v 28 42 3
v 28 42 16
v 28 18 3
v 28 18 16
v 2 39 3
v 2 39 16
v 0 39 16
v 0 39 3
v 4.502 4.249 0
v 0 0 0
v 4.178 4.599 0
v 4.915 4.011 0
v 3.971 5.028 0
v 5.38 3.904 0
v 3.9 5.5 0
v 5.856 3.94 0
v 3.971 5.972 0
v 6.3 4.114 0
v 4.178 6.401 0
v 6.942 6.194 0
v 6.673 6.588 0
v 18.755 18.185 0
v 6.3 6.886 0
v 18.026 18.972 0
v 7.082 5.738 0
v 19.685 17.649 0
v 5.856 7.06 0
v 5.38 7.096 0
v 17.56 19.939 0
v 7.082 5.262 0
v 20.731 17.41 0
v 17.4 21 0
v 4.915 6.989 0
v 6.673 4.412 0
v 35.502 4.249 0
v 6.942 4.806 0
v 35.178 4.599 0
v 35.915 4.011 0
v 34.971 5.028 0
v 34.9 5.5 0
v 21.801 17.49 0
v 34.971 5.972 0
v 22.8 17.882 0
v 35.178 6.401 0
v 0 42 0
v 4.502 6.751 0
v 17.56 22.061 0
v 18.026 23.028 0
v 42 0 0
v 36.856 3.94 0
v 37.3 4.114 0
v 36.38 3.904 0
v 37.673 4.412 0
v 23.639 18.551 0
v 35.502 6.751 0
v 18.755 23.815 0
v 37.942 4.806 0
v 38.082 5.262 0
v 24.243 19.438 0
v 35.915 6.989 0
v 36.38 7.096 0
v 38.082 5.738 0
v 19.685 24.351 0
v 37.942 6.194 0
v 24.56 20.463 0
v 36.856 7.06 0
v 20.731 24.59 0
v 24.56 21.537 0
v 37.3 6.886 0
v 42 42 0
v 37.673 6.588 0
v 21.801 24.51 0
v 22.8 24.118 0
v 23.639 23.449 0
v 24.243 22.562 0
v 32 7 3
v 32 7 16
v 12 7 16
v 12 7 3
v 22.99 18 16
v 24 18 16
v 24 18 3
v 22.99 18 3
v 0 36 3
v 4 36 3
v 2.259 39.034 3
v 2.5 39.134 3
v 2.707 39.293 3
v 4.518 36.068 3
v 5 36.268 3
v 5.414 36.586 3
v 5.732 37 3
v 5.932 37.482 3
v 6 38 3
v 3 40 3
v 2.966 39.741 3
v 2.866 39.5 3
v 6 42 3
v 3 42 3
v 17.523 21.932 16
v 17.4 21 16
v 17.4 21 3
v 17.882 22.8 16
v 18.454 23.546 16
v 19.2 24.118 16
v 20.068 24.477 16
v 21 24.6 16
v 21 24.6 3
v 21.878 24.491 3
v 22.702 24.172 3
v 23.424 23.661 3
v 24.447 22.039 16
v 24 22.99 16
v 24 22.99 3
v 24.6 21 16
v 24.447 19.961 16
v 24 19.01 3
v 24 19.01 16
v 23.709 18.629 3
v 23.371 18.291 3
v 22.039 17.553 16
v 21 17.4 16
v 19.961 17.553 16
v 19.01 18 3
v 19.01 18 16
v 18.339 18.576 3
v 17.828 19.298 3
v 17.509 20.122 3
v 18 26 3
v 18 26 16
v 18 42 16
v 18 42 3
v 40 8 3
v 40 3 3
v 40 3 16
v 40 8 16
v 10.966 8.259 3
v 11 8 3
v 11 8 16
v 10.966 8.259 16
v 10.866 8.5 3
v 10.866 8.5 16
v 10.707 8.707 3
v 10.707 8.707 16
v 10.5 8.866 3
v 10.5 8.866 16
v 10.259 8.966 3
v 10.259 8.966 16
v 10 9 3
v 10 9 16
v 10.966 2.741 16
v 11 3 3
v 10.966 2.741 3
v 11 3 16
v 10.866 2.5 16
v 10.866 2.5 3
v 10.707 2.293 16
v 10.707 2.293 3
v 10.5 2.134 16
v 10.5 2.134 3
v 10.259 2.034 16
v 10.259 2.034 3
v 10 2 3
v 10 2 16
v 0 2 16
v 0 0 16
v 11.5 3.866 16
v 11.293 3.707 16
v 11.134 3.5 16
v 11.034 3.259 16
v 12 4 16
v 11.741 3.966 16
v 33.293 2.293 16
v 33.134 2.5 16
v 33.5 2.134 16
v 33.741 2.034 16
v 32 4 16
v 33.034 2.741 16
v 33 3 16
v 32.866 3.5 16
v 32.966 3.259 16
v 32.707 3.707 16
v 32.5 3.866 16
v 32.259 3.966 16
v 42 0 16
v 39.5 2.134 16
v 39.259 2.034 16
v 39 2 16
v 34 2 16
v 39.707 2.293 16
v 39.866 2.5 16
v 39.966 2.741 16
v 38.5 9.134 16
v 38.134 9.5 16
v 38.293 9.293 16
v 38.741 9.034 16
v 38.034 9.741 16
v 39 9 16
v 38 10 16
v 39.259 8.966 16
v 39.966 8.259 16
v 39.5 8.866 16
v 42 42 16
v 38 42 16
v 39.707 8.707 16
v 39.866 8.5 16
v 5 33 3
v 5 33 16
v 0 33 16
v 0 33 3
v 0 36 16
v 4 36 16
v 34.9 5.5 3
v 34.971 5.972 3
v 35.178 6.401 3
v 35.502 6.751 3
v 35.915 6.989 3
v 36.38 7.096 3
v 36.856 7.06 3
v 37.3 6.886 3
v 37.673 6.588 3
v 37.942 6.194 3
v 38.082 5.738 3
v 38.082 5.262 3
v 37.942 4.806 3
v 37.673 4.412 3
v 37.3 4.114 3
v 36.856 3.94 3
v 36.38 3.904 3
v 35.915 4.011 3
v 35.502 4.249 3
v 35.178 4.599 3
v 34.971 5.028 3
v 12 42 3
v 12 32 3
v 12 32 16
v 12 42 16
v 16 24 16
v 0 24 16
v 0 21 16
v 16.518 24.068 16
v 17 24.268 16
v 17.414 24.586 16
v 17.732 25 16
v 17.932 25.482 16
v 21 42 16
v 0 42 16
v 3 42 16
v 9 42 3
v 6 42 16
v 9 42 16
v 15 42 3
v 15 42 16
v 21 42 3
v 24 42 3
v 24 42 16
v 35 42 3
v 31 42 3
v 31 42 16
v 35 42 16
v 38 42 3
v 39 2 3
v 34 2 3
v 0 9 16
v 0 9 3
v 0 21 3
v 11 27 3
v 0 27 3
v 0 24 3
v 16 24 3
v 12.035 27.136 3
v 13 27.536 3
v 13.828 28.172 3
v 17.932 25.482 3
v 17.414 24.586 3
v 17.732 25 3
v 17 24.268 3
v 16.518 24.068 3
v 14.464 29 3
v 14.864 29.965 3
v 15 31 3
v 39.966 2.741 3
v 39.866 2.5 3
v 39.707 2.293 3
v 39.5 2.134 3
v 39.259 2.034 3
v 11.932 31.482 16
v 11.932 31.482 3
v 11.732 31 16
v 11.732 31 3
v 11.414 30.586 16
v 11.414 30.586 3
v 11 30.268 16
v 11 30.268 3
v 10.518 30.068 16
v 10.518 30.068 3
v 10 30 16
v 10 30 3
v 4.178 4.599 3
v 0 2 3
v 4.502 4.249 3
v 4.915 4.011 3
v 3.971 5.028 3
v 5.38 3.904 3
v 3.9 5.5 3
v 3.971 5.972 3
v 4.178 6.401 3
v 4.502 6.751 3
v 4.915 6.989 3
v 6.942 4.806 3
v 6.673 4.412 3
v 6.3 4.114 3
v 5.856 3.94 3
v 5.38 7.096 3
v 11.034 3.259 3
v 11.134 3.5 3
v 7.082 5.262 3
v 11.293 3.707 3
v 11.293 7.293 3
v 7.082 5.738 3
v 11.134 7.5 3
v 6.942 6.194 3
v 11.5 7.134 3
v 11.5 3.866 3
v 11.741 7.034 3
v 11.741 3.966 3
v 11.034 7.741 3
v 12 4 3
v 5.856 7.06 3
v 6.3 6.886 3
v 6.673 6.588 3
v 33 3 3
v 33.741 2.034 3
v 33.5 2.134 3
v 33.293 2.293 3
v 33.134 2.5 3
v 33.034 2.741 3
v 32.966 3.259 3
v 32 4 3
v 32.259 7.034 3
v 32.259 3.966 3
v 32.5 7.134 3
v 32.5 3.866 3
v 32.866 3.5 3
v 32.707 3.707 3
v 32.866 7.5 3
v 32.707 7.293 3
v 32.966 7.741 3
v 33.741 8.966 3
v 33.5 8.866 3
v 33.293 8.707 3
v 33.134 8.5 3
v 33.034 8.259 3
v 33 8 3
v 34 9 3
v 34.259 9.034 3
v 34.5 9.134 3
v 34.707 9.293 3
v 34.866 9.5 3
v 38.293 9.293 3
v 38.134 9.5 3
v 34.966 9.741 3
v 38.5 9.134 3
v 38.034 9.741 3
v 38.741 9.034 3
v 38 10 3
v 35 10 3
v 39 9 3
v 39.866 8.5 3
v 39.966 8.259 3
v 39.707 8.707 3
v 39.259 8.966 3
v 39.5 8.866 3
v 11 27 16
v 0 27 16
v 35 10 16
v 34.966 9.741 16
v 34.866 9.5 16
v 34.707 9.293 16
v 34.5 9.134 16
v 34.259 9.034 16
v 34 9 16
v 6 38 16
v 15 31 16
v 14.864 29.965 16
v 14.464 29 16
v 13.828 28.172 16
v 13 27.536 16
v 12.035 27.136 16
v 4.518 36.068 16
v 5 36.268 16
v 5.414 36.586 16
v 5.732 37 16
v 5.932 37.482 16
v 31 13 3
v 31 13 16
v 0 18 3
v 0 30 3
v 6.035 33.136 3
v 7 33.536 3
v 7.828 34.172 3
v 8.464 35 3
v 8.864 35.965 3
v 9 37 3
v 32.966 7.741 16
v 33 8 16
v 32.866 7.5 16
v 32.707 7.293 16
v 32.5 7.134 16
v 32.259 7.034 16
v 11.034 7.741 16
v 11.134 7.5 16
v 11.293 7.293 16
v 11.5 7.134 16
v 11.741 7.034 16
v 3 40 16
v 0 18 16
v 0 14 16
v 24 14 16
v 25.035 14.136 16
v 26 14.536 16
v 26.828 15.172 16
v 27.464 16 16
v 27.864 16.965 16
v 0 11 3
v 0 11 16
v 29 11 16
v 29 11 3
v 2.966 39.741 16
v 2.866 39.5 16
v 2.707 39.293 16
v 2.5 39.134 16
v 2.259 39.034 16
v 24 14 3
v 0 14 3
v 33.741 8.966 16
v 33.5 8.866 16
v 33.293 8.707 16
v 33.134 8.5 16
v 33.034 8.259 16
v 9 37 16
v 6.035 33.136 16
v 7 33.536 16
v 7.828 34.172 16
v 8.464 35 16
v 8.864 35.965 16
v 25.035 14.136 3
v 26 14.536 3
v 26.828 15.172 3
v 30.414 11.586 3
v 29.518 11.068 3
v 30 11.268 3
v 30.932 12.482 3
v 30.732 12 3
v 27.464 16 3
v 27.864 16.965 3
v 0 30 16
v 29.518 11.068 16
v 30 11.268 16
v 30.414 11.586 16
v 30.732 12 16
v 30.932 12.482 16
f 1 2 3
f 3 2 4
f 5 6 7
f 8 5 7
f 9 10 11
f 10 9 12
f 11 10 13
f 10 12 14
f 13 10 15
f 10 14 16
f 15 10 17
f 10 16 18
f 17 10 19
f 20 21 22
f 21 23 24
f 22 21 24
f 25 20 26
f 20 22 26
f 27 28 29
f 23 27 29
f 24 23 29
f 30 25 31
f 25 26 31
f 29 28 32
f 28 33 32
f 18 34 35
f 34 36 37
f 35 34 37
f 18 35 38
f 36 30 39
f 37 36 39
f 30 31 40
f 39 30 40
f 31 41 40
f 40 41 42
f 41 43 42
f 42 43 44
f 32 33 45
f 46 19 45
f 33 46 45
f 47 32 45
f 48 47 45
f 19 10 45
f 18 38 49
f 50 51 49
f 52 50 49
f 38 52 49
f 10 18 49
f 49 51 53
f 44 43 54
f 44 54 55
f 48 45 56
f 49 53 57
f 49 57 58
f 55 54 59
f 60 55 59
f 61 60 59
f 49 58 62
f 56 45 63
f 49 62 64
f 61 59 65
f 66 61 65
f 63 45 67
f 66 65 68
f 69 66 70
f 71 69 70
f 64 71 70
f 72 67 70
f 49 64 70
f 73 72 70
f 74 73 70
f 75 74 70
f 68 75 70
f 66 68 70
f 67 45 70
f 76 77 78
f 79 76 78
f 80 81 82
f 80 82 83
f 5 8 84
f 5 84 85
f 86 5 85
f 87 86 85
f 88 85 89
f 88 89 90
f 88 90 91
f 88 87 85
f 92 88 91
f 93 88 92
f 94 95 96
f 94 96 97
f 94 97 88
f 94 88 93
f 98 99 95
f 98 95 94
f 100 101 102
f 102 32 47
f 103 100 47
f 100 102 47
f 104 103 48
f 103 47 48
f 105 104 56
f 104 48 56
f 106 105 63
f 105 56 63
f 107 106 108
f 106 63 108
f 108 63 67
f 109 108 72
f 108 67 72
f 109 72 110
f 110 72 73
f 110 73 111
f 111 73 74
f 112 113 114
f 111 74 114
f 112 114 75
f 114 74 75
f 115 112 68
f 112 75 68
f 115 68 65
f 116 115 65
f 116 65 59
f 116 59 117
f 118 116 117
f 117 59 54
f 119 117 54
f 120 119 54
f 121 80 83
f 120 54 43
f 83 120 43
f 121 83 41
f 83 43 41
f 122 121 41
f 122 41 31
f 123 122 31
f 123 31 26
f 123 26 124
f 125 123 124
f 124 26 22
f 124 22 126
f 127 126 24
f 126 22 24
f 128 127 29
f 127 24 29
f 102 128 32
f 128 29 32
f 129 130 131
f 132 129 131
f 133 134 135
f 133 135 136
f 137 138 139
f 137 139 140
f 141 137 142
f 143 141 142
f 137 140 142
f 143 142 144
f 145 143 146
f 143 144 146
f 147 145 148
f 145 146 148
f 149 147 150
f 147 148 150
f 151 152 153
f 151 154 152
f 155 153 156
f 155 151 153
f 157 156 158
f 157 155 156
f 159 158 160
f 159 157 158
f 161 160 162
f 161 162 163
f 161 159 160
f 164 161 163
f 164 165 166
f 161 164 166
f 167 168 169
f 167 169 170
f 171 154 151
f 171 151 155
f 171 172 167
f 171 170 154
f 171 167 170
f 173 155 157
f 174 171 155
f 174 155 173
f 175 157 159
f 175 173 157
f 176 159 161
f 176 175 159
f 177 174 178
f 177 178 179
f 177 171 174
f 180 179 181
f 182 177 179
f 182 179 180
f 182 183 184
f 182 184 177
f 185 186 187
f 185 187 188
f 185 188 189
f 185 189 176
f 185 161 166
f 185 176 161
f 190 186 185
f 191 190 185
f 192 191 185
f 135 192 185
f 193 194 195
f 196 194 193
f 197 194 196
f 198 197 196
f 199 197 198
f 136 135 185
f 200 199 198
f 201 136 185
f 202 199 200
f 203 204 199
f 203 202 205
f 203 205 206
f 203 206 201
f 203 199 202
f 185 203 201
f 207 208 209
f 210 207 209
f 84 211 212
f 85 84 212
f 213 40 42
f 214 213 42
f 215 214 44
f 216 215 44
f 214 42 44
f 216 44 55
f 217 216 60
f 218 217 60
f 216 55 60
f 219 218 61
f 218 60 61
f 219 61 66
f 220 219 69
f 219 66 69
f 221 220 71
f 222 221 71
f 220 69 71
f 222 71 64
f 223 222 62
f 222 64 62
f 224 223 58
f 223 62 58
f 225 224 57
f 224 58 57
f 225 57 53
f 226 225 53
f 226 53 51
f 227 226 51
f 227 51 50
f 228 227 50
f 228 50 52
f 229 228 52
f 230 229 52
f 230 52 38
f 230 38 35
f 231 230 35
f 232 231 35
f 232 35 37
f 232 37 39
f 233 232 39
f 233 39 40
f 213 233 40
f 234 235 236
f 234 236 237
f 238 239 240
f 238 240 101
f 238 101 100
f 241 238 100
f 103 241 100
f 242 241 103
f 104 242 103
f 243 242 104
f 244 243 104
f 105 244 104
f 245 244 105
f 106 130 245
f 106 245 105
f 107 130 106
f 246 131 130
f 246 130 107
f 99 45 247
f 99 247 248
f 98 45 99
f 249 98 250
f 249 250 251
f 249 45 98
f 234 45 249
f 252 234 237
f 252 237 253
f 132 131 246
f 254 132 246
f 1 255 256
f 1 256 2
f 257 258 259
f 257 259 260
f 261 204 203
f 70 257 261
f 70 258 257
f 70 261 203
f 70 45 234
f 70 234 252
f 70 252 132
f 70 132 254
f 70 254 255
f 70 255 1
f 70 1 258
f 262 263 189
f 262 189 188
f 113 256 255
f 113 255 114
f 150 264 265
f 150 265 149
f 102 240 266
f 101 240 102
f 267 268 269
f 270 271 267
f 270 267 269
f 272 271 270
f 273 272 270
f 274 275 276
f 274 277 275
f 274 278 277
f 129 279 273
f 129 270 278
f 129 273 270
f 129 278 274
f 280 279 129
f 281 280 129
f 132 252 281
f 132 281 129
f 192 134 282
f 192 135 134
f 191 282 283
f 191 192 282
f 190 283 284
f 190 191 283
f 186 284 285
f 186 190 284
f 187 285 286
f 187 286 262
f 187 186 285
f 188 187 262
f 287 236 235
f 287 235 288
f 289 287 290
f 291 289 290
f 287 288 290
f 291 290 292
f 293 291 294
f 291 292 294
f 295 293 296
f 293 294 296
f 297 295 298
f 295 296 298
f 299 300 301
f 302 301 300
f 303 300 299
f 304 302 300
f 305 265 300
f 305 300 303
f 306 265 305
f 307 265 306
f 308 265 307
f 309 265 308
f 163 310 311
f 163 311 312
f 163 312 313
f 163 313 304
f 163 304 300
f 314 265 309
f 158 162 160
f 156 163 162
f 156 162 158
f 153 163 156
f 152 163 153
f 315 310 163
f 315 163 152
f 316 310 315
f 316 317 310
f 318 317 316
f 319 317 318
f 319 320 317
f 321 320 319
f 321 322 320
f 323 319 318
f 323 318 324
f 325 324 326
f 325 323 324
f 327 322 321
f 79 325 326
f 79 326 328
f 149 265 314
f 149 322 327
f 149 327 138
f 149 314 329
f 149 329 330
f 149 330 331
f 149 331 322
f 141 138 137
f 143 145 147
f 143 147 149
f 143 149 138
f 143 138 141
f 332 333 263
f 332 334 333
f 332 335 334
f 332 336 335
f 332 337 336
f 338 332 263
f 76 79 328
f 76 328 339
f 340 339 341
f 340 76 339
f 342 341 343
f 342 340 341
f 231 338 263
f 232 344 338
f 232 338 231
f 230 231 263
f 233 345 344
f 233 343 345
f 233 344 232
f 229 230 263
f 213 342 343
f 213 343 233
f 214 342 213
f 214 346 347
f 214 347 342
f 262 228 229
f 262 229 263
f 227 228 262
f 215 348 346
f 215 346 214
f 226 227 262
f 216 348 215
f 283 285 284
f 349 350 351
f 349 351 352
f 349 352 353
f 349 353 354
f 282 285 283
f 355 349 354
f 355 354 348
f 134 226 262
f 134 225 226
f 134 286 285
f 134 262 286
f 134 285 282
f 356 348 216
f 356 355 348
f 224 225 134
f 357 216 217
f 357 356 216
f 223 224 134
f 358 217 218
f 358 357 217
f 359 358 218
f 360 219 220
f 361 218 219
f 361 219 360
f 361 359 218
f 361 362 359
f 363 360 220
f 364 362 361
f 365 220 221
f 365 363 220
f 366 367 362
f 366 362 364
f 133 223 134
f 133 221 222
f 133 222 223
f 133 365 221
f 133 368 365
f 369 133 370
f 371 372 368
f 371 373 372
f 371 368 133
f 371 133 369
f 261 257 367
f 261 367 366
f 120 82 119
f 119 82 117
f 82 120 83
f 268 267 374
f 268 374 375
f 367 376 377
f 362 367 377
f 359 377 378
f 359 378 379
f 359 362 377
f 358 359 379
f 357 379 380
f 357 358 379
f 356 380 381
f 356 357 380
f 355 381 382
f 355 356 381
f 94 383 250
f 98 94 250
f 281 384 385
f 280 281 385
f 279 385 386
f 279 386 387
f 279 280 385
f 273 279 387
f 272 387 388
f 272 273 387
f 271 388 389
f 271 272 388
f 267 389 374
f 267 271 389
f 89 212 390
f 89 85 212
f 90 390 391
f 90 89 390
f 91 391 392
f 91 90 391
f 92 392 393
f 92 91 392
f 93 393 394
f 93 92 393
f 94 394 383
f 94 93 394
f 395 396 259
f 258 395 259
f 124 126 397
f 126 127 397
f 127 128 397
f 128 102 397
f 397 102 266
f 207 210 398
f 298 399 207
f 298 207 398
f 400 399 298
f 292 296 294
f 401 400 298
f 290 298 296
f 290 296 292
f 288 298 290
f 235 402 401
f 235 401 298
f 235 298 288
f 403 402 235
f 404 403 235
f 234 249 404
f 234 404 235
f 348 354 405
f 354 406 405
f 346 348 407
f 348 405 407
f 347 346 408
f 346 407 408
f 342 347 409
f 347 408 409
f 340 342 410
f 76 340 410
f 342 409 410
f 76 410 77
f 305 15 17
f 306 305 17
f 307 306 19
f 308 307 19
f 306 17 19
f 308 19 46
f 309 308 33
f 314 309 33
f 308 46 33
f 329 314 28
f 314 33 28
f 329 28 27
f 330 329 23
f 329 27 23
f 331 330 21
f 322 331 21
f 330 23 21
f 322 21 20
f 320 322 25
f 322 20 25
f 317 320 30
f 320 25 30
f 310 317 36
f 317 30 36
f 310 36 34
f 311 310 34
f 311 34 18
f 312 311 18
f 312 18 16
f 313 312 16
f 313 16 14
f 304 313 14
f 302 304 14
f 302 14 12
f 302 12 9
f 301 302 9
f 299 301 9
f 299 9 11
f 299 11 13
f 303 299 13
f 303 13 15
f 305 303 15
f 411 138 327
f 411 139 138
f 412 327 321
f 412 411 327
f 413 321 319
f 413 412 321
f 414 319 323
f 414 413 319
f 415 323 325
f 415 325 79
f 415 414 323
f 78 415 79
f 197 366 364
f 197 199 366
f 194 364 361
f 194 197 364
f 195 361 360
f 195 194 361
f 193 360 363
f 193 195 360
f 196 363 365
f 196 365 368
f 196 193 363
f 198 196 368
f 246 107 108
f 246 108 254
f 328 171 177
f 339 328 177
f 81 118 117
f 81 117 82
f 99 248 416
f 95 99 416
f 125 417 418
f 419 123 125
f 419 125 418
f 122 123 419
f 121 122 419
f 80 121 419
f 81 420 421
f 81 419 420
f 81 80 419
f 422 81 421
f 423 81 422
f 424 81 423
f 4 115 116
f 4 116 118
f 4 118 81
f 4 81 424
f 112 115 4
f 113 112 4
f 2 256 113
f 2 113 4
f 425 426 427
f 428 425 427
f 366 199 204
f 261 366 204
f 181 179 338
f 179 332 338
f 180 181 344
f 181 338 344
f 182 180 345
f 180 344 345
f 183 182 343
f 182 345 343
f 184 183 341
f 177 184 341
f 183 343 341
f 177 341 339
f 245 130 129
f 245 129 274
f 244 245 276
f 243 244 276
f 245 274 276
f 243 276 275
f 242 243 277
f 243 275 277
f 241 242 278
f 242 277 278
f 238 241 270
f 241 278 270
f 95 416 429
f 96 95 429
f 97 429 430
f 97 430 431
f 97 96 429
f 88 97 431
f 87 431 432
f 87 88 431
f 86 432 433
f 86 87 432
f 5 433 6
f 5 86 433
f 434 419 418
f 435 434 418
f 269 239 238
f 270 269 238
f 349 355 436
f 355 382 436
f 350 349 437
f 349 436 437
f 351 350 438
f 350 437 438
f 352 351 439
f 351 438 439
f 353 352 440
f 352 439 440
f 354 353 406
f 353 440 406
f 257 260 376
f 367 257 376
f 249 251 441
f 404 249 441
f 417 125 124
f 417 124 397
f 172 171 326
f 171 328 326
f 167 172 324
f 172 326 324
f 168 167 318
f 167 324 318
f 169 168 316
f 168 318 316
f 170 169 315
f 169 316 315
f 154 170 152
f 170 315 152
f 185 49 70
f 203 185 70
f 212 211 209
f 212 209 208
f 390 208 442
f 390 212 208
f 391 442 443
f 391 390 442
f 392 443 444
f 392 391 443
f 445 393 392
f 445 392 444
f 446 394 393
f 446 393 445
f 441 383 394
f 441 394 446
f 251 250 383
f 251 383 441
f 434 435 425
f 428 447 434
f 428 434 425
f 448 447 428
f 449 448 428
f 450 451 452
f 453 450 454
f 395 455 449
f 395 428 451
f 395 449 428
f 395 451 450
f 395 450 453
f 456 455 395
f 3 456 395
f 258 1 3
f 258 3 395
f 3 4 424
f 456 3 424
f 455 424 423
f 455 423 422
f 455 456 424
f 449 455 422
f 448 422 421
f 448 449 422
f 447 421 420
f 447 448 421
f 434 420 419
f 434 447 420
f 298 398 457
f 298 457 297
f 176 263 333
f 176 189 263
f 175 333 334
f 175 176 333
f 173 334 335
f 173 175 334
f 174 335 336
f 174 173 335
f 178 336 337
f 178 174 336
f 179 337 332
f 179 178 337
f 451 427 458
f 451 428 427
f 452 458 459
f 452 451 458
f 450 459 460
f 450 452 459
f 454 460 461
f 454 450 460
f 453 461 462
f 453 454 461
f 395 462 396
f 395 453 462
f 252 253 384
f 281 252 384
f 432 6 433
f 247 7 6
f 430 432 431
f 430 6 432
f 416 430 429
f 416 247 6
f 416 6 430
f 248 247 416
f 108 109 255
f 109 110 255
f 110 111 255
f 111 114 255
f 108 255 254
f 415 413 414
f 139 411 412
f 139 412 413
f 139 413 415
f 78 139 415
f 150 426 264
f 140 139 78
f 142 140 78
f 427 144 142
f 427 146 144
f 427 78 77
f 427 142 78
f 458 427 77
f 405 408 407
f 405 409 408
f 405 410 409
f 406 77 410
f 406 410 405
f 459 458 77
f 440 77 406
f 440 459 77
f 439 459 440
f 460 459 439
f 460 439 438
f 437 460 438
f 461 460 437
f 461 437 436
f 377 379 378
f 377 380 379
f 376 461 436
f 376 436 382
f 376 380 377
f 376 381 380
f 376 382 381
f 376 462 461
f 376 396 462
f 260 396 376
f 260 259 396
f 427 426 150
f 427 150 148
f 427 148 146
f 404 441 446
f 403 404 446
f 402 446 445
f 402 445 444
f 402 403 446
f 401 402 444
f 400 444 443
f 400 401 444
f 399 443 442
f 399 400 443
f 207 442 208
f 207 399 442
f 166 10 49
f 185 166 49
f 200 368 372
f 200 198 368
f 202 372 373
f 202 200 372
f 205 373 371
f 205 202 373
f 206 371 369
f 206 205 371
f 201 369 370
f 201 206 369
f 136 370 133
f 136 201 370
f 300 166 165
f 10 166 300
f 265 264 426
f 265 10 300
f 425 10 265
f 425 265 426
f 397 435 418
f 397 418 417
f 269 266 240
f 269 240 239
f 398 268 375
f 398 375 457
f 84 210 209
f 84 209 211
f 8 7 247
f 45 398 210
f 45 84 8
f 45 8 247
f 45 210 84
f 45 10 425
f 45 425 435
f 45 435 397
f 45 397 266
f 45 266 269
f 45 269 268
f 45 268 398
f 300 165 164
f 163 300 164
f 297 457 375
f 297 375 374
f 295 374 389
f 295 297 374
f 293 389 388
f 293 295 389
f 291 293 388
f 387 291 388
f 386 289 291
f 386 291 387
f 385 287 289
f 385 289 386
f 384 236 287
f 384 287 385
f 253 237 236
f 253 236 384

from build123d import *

# Parameters (mm, degrees)
SKETCH1_W           = 42
SKETCH1_H           = 42
BOSS_EXTRUDE1_DEPTH = 16
CUT_EXTRUDE1_DEPTH  = 13
SKETCH3_R           = 3.6
SKETCH3_R_2         = 1.6
CUT_EXTRUDE2_DEPTH  = 62.514225997
SKETCH4_W           = 11
SKETCH4_H           = 7
SKETCH4_W_2         = 7
CUT_EXTRUDE3_DEPTH  = 61.802960454
FILLET2_R           = 1
FILLET3_R           = 4
FILLET4_R           = 4
FILLET5_R           = 4
FILLET6_R           = 1
FILLET7_R           = 1
FILLET8_R           = 1
FILLET10_R          = 1
FILLET11_R          = 1
FILLET12_R          = 1
FILLET13_R          = 1
FILLET14_R          = 1
FILLET15_R          = 1
FILLET16_R          = 1
FILLET17_R          = 1
FILLET18_R          = 1
FILLET19_R          = 2
FILLET20_R          = 2
FILLET21_R          = 2
FILLET22_R          = 2


with BuildPart() as part:
    # Sketch1 → Boss-Extrude1 (new body)
    with BuildSketch(Plane.XY):
        with Locations((21, 21)):
            Rectangle(SKETCH1_W, SKETCH1_H)
    extrude(amount=BOSS_EXTRUDE1_DEPTH)

    # Sketch2 → Cut-Extrude1 (cut)
    with BuildSketch(Plane.XY.offset(16)):
        Polygon((3, 42), (3, 39), (0, 39), (0, 36), (6, 36), (6, 42), align=None)
        Polygon((9, 42), (9, 33), (0, 33), (0, 30), (12, 30), (12, 42), align=None)
        Polygon((15, 42), (15, 27), (0, 27), (0, 24), (18, 24), (18, 42), align=None)
        Polygon((0, 21), (21, 21), (21, 42), (24, 42), (24, 18), (0, 18), align=None)
        Polygon((28, 42), (28, 14), (0, 14), (0, 11), (31, 11), (31, 42), align=None)
        Polygon((35, 42), (35, 7), (0, 7), (0, 4), (38, 4), (38, 42), align=None)
    extrude(amount=-CUT_EXTRUDE1_DEPTH, mode=Mode.SUBTRACT)

    # Sketch3 → Cut-Extrude2 (cut, through all)
    with BuildSketch(Plane(origin=(0, 0, 0), x_dir=(-1, 0, 0), z_dir=(0, 0, -1))):
        with Locations((-21, 21)):
            Circle(SKETCH3_R)
        with Locations((-5.5, 5.5)):
            Circle(SKETCH3_R_2)
        with Locations((-36.5, 5.5)):
            Circle(SKETCH3_R_2)
    extrude(amount=-CUT_EXTRUDE2_DEPTH, mode=Mode.SUBTRACT)

    # Sketch4 → Cut-Extrude3 (cut, through all)
    with BuildSketch(Plane.XY.offset(3)):
        with Locations((5.5, 5.5)):
            Rectangle(SKETCH4_W, SKETCH4_H)
        with Locations((36.5, 5.5)):
            Rectangle(SKETCH4_W_2, SKETCH4_H)
    extrude(amount=CUT_EXTRUDE3_DEPTH, mode=Mode.SUBTRACT)

    # Fillet2
    fillet2_edges = [part.edges().sort_by_distance(p)[0] for p in [
        (3, 39, 9.5),
    ]]
    fillet(fillet2_edges, radius=FILLET2_R)

    # Fillet3
    fillet3_edges = [part.edges().sort_by_distance(p)[0] for p in [
        (9, 33, 9.5),
    ]]
    fillet(fillet3_edges, radius=FILLET3_R)

    # Fillet4
    fillet4_edges = [part.edges().sort_by_distance(p)[0] for p in [
        (15, 27, 9.5),
    ]]
    fillet(fillet4_edges, radius=FILLET4_R)

    # Fillet5
    fillet5_edges = [part.edges().sort_by_distance(p)[0] for p in [
        (28, 14, 9.5),
    ]]
    fillet(fillet5_edges, radius=FILLET5_R)

    # Fillet6
    fillet6_edges = [part.edges().sort_by_distance(p)[0] for p in [
        (35, 9, 9.5),
    ]]
    fillet(fillet6_edges, radius=FILLET6_R)

    # Fillet7
    fillet7_edges = [part.edges().sort_by_distance(p)[0] for p in [
        (33, 7, 9.5),
    ]]
    fillet(fillet7_edges, radius=FILLET7_R)

    # Fillet8
    fillet8_edges = [part.edges().sort_by_distance(p)[0] for p in [
        (40, 2, 9.5),
    ]]
    fillet(fillet8_edges, radius=FILLET8_R)

    # Fillet10
    fillet10_edges = [part.edges().sort_by_distance(p)[0] for p in [
        (33, 9, 9.5),
    ]]
    fillet(fillet10_edges, radius=FILLET10_R - 0.0001)  # a hair under: the kernel refuses the full size

    # Fillet11
    fillet11_edges = [part.edges().sort_by_distance(p)[0] for p in [
        (38, 9, 9.5),
    ]]
    fillet(fillet11_edges, radius=FILLET11_R)

    # Fillet12
    fillet12_edges = [part.edges().sort_by_distance(p)[0] for p in [
        (40, 9, 9.5),
    ]]
    fillet(fillet12_edges, radius=FILLET12_R - 0.0001)  # a hair under: the kernel refuses the full size

    # Fillet13
    fillet13_edges = [part.edges().sort_by_distance(p)[0] for p in [
        (33, 2, 9.5),
    ]]
    fillet(fillet13_edges, radius=FILLET13_R)

    # Fillet14
    fillet14_edges = [part.edges().sort_by_distance(p)[0] for p in [
        (33, 4, 9.5),
    ]]
    fillet(fillet14_edges, radius=FILLET14_R - 0.0001)  # a hair under: the kernel refuses the full size

    # Fillet15
    fillet15_edges = [part.edges().sort_by_distance(p)[0] for p in [
        (11, 4, 9.5),
    ]]
    fillet(fillet15_edges, radius=FILLET15_R)

    # Fillet16
    fillet16_edges = [part.edges().sort_by_distance(p)[0] for p in [
        (11, 2, 9.5),
    ]]
    fillet(fillet16_edges, radius=FILLET16_R - 0.0001)  # a hair under: the kernel refuses the full size

    # Fillet17
    fillet17_edges = [part.edges().sort_by_distance(p)[0] for p in [
        (11, 7, 9.5),
    ]]
    fillet(fillet17_edges, radius=FILLET17_R)

    # Fillet18
    fillet18_edges = [part.edges().sort_by_distance(p)[0] for p in [
        (11, 9, 9.5),
    ]]
    fillet(fillet18_edges, radius=FILLET18_R - 0.0001)  # a hair under: the kernel refuses the full size

    # Fillet19
    fillet19_edges = [part.edges().sort_by_distance(p)[0] for p in [
        (6, 36, 9.5),
    ]]
    fillet(fillet19_edges, radius=FILLET19_R)

    # Fillet20
    fillet20_edges = [part.edges().sort_by_distance(p)[0] for p in [
        (12, 30, 9.5),
    ]]
    fillet(fillet20_edges, radius=FILLET20_R)

    # Fillet21
    fillet21_edges = [part.edges().sort_by_distance(p)[0] for p in [
        (18, 24, 9.5),
    ]]
    fillet(fillet21_edges, radius=FILLET21_R)

    # Fillet22
    fillet22_edges = [part.edges().sort_by_distance(p)[0] for p in [
        (31, 11, 9.5),
    ]]
    fillet(fillet22_edges, radius=FILLET22_R)


solid = part.part
